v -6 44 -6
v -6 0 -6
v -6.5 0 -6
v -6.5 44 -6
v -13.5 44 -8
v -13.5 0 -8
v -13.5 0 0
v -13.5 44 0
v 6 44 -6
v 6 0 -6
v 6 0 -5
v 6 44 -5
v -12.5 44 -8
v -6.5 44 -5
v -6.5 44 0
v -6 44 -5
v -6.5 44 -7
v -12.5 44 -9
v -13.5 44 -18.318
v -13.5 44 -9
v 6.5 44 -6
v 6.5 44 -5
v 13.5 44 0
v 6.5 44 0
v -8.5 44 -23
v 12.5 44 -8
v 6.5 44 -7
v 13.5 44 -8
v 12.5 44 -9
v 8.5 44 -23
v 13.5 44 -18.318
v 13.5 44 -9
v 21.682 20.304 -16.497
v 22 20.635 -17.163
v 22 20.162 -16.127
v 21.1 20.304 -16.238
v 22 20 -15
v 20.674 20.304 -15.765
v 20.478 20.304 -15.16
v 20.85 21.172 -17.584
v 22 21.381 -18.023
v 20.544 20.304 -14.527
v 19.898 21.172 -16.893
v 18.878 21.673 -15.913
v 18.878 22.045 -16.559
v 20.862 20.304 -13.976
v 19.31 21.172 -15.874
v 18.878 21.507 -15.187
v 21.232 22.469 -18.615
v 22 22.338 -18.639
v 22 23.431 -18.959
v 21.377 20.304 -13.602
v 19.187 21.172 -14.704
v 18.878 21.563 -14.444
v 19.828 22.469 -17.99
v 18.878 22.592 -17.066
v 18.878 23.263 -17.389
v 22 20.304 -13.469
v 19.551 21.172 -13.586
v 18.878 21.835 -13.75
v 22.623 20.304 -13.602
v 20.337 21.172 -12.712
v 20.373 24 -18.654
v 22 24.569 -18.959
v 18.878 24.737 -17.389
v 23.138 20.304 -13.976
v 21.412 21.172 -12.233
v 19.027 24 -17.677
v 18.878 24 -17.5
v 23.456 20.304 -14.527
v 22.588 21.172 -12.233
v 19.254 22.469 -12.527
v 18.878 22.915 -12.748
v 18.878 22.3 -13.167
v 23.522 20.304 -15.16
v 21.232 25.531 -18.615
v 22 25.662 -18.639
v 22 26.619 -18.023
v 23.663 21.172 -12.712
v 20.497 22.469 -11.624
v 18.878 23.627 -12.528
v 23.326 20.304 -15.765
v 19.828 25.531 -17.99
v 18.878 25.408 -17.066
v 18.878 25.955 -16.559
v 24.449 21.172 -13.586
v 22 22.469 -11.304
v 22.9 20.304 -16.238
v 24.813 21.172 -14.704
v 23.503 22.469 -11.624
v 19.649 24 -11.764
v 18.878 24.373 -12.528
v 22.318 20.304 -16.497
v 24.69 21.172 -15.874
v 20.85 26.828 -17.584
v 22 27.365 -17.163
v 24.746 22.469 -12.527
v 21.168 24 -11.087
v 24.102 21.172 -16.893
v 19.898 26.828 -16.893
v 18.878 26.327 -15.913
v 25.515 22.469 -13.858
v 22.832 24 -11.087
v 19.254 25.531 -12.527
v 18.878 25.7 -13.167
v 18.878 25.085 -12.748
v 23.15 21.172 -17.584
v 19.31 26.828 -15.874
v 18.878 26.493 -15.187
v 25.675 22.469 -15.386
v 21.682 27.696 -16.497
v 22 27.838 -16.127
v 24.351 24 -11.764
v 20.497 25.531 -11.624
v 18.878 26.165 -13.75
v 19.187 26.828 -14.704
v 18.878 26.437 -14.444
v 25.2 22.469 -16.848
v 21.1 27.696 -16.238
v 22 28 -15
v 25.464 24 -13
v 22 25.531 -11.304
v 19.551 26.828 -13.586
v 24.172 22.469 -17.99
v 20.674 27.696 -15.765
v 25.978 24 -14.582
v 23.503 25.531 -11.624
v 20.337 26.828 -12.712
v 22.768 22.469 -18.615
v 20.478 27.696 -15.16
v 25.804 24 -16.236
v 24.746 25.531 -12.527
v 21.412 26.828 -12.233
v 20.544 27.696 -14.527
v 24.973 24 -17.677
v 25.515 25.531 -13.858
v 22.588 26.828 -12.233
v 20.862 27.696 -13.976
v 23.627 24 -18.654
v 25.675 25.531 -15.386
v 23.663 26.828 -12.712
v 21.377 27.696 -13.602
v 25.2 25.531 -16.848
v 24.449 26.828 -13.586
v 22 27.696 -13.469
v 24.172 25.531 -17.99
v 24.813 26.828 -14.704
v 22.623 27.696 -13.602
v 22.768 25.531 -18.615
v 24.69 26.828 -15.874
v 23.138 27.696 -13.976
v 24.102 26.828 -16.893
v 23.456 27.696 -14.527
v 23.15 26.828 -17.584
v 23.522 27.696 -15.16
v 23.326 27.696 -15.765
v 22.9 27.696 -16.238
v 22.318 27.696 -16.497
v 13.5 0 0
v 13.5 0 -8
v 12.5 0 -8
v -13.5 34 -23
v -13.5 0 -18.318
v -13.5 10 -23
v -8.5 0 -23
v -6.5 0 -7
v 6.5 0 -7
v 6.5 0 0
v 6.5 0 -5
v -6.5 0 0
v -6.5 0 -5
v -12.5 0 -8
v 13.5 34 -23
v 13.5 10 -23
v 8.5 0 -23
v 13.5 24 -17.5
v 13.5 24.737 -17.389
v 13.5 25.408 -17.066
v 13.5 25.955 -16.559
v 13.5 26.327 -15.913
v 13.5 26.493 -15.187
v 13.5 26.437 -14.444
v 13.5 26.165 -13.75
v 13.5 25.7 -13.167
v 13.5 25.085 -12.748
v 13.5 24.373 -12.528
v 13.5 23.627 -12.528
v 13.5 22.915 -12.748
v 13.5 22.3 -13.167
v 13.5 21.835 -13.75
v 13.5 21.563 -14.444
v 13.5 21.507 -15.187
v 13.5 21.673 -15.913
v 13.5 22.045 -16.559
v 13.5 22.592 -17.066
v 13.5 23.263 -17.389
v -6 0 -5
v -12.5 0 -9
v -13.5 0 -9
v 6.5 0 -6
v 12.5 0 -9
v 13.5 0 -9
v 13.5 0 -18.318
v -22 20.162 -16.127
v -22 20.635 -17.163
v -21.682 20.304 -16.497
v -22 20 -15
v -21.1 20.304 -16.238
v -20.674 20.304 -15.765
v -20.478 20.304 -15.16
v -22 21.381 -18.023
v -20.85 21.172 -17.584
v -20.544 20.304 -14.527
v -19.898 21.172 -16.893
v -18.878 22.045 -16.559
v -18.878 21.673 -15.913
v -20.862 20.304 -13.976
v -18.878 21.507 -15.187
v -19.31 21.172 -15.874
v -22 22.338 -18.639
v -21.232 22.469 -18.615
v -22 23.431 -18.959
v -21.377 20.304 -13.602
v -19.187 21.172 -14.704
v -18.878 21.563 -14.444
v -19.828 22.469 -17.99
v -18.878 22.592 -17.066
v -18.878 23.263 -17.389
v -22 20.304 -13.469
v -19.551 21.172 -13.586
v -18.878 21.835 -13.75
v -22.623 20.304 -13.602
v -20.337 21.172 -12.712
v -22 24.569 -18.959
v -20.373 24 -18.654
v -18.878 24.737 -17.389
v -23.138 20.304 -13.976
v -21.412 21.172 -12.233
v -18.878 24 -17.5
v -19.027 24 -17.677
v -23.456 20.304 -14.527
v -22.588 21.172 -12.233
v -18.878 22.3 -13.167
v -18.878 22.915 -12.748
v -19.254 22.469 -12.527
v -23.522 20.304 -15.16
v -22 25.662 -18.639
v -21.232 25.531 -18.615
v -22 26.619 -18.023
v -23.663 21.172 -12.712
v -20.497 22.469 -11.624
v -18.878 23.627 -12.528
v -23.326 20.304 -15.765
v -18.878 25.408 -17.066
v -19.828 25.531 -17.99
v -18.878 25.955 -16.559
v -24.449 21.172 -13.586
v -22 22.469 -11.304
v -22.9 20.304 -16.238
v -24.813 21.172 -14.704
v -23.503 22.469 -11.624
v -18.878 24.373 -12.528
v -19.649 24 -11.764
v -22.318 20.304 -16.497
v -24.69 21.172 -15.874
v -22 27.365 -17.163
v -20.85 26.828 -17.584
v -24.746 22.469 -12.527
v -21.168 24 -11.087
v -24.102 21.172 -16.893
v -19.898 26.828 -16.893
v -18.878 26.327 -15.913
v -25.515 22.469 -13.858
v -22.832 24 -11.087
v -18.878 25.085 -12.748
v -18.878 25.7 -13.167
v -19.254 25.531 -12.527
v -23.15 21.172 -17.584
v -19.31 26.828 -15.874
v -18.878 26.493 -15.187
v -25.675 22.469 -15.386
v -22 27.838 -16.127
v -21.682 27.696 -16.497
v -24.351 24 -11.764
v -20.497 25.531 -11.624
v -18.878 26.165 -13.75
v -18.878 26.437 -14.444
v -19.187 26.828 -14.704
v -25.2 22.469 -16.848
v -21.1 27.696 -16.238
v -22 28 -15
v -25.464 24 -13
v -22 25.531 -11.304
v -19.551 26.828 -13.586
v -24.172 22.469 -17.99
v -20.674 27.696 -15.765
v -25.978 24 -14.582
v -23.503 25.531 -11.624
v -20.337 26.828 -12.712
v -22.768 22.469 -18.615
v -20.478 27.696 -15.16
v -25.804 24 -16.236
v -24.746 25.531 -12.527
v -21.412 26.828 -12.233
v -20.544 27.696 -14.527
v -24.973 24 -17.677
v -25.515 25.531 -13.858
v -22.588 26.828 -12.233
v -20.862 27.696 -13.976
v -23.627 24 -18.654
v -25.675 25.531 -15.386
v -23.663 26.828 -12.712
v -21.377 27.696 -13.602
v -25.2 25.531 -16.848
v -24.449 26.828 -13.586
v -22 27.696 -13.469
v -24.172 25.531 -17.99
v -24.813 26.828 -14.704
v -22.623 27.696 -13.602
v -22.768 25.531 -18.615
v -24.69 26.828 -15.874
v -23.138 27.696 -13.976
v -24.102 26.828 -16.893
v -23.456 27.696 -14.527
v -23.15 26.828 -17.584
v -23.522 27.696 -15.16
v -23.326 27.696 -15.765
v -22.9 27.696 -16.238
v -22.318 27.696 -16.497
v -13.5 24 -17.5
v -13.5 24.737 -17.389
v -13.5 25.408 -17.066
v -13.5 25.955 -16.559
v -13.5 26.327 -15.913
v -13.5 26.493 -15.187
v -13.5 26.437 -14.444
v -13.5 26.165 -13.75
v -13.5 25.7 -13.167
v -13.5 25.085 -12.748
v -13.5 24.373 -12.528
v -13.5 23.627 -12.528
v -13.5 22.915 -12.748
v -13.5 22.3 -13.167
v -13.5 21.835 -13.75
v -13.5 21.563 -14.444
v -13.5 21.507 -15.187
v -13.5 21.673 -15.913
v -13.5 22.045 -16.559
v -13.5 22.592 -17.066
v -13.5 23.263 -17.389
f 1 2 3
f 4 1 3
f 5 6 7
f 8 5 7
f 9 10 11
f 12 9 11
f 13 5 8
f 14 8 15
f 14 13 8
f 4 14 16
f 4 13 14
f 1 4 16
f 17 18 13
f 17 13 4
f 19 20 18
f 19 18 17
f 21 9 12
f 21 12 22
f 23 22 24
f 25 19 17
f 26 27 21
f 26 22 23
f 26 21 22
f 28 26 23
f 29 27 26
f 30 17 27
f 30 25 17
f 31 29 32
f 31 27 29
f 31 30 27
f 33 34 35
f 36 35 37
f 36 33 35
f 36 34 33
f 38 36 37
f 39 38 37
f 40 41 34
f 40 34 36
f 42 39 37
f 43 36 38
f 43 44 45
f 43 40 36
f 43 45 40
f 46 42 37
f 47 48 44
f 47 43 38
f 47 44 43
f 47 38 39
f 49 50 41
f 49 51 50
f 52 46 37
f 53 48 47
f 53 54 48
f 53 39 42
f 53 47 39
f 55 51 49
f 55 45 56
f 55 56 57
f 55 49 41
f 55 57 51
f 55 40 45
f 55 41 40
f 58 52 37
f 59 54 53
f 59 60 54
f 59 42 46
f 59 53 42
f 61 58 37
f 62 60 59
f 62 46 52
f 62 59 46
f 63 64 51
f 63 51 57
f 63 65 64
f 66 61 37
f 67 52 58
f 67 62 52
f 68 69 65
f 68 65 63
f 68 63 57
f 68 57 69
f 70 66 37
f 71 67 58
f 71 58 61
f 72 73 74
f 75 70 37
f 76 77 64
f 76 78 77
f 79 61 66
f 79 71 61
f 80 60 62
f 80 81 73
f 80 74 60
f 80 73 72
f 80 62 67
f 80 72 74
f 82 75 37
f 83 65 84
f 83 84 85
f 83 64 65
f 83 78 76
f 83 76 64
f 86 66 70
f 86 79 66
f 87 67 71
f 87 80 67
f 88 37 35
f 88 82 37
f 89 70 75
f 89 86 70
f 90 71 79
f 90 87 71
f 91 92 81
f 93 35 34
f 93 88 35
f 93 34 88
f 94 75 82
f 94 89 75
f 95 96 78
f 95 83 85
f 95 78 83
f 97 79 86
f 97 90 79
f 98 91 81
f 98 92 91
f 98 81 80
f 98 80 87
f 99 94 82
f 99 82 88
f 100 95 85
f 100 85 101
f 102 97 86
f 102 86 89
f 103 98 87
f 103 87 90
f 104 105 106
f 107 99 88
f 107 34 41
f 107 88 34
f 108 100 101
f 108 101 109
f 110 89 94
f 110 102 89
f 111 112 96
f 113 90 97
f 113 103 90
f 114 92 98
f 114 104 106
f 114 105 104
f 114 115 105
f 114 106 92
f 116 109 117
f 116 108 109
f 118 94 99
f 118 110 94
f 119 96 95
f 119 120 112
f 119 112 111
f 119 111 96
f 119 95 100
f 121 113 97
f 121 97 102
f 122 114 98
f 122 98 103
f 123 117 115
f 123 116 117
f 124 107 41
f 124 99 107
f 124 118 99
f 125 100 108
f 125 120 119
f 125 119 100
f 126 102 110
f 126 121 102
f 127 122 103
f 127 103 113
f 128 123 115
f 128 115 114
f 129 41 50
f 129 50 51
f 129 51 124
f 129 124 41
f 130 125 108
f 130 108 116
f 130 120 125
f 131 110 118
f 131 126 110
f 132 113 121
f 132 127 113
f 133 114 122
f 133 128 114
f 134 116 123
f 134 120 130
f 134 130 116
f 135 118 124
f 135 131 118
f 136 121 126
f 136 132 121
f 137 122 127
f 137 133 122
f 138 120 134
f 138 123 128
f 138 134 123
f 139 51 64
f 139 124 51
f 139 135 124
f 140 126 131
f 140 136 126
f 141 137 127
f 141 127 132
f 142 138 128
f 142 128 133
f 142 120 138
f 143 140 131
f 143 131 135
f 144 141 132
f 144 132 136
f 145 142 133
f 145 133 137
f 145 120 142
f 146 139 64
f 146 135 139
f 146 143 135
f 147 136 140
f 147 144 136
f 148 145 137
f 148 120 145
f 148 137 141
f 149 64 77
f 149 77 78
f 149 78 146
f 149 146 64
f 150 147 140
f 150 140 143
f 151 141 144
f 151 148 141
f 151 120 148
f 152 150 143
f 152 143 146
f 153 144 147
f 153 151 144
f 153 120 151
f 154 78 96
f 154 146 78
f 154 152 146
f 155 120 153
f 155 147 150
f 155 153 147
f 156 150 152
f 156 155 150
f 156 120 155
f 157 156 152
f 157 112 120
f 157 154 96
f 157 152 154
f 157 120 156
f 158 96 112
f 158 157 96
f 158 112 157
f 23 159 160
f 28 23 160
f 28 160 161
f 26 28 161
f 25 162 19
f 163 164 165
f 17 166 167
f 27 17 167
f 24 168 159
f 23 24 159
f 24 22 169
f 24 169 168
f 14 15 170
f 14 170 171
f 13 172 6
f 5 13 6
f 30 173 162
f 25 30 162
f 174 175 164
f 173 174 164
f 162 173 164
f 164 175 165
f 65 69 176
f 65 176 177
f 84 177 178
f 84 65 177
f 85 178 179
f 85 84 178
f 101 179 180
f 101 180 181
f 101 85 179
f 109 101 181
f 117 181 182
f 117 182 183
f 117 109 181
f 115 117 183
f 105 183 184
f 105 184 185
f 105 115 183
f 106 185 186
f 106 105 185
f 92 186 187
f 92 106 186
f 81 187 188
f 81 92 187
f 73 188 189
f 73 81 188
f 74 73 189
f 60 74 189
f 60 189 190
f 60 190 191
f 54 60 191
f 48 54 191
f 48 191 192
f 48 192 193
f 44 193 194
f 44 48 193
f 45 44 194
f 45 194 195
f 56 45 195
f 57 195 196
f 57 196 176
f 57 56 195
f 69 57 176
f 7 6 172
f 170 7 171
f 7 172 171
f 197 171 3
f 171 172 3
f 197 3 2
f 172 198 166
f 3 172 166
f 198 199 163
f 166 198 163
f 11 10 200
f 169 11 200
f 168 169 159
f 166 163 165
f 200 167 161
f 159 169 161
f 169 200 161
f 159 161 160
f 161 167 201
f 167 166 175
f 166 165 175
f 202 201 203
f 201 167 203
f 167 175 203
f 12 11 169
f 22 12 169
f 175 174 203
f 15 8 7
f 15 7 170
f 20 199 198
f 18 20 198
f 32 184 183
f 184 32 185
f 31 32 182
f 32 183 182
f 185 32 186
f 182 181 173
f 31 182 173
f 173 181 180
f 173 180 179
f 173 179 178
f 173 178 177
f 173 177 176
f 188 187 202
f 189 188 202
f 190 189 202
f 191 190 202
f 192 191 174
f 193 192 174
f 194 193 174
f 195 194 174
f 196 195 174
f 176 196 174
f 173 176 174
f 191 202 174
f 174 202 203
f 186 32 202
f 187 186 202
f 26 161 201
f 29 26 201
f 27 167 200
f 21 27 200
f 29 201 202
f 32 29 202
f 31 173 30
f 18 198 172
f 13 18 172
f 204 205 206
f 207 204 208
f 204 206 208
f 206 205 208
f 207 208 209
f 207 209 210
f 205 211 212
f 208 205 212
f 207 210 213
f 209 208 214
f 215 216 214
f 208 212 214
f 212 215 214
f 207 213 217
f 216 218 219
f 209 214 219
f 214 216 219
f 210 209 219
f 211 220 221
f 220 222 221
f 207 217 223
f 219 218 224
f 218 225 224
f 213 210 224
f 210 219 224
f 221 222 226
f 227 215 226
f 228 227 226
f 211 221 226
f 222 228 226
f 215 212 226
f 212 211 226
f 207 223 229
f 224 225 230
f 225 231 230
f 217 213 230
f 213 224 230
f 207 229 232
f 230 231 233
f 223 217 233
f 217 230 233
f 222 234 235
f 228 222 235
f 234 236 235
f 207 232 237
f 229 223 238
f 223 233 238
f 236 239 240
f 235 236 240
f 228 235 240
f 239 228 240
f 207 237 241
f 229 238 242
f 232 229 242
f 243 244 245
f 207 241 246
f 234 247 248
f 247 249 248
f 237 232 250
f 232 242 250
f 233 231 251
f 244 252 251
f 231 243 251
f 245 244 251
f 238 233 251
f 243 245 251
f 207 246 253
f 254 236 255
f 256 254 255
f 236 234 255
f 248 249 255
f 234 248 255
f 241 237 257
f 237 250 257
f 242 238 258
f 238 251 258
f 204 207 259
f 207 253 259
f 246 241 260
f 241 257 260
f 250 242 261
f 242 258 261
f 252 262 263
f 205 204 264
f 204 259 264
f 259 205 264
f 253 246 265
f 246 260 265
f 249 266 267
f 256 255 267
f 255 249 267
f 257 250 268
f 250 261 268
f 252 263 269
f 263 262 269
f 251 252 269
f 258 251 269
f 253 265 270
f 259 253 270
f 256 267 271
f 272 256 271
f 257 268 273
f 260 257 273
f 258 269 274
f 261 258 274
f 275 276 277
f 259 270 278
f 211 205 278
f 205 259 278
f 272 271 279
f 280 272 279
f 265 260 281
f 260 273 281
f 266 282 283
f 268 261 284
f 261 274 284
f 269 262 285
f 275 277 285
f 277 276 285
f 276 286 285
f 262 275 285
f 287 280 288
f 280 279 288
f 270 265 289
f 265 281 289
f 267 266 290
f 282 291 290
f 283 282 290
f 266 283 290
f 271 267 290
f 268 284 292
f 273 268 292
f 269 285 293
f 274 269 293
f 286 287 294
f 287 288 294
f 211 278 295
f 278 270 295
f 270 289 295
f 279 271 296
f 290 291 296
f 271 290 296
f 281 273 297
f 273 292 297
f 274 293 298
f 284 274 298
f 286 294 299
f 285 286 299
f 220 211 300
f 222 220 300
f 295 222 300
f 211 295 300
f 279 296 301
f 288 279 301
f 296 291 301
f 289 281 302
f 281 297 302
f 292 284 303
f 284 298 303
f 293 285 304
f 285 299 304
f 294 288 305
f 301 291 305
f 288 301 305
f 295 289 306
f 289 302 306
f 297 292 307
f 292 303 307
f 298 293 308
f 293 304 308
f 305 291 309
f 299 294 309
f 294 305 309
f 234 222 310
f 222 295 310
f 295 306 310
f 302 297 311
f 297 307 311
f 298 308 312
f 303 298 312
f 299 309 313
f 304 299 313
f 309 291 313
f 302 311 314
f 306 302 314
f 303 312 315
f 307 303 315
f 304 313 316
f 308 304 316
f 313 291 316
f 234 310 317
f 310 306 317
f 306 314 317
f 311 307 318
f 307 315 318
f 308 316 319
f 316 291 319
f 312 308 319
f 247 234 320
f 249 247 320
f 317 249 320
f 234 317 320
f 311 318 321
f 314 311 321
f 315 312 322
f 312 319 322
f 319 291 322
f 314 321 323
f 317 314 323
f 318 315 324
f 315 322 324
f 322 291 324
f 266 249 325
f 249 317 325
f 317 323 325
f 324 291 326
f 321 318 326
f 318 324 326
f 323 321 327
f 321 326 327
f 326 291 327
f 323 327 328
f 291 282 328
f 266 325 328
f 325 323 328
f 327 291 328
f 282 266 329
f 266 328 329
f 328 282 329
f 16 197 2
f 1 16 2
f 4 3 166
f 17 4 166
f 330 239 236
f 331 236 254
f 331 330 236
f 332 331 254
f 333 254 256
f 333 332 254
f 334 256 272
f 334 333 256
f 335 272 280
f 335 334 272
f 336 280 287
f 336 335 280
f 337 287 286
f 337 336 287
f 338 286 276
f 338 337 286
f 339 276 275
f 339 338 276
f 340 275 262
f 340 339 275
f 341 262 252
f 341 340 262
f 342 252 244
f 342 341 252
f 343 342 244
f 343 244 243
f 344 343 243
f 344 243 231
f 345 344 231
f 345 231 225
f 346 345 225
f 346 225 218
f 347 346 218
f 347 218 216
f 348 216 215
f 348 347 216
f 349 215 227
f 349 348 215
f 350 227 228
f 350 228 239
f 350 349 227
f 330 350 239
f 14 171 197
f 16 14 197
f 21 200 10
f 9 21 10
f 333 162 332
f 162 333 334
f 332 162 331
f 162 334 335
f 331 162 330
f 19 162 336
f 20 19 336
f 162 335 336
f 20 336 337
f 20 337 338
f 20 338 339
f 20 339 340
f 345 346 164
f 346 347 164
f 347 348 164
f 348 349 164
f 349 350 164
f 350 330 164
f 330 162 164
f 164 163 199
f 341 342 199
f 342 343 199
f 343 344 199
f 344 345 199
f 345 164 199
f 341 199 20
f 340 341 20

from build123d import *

# Parameters (mm, degrees)
EXTRUDE_1_DEPTH = 44
SKETCH_4_R      = 2.5
EXTRUDE_2_DEPTH = 22


with BuildPart() as part:
    # 草圖1 → 填料-伸長1 (new body)
    with BuildSketch(Plane(origin=(0, 0, 0), x_dir=(1, 0, 0), z_dir=(0, 1, 0))):
        Polygon((-13.5, 0), (-6.5, 0), (-6.5, 5), (-6, 5), (-6, 6), (-6.5, 6), (-6.5, 7), (6.5, 7), (6.5, 6), (6, 6), (6, 5), (6.5, 5), (6.5, 0), (13.5, 0), (13.5, 8), (12.5, 8), (12.5, 9), (13.5, 9), (13.5, 23), (-13.5, 23), (-13.5, 9), (-12.5, 9), (-12.5, 8), (-13.5, 8), align=None)
    extrude(amount=EXTRUDE_1_DEPTH)

    # 除料-掃出1: sweep along a path in 草圖3
    with BuildLine(Plane(origin=(13.5, 0, 0), x_dir=(0, 0, -1), z_dir=(1, 0, 0))) as sweep_1_path:
        Line((23, 34), (18.317914301, 44))
    # 草圖2 → 除料-掃出1 (sweep, cut)
    with BuildSketch(Plane(origin=(0, 0, -23), x_dir=(-1, 0, 0), z_dir=(0, 0, -1))):
        Polygon((-13.5, 44), (-8.5, 44), (-13.5, 34), align=None)
    sweep_1 = sweep(path=sweep_1_path.line, mode=Mode.SUBTRACT)

    # 鏡射1: 除料-掃出1 across plane
    add(sweep_1.mirror(Plane(origin=(0, 0, 0), x_dir=(0, 0, 1), z_dir=(1, 0, 0))), mode=Mode.SUBTRACT)

    # 鏡射2: 除料-掃出1 across plane
    add(sweep_1.mirror(Plane(origin=(0, 22, 0), x_dir=(0, 0, 1), z_dir=(0, -1, 0))), mode=Mode.SUBTRACT)

    # 鏡射2 copy 1: sweep along a path in 鏡射2 copy 1 path
    with BuildLine(Plane(origin=(-13.5, 44, 0), x_dir=(0, 0, -1), z_dir=(-1, 0, 0))) as mirror_2_copy_1_path:
        Line((23, 34), (18.317914301, 44))
    # 鏡射2 copy 1 sketch → 鏡射2 copy 1 (sweep, cut)
    with BuildSketch(Plane(origin=(0, 44, -23), x_dir=(1, 0, 0), z_dir=(0, 0, -1))):
        Polygon((-13.5, 44), (-8.5, 44), (-13.5, 34), align=None)
    sweep(path=mirror_2_copy_1_path.line, mode=Mode.SUBTRACT)

    # 草圖4 → 填料-伸長2 (add, symmetric)
    with BuildSketch(Plane(origin=(0, 0, 0), x_dir=(0, 0, -1), z_dir=(1, 0, 0))):
        with Locations((15, 24)):
            Circle(SKETCH_4_R)
    extrude(amount=EXTRUDE_2_DEPTH, both=True)

    # 草圖5 → 旋轉1 (revolve)
    with BuildSketch(Plane(origin=(22, 0, 0), x_dir=(0, 0, -1), z_dir=(1, 0, 0))):
        with BuildLine():
            Line((15, 28), (15, 20))
            ThreePointArc((15, 20), (19, 24), (15, 28))
        make_face()
    revolve_1 = revolve(axis=Axis((22, 24, -15), (0, 1, 0)))

    # 鏡射3: 旋轉1 across plane
    add(revolve_1.mirror(Plane(origin=(0, 0, 0), x_dir=(0, 0, 1), z_dir=(1, 0, 0))))


solid = part.part
